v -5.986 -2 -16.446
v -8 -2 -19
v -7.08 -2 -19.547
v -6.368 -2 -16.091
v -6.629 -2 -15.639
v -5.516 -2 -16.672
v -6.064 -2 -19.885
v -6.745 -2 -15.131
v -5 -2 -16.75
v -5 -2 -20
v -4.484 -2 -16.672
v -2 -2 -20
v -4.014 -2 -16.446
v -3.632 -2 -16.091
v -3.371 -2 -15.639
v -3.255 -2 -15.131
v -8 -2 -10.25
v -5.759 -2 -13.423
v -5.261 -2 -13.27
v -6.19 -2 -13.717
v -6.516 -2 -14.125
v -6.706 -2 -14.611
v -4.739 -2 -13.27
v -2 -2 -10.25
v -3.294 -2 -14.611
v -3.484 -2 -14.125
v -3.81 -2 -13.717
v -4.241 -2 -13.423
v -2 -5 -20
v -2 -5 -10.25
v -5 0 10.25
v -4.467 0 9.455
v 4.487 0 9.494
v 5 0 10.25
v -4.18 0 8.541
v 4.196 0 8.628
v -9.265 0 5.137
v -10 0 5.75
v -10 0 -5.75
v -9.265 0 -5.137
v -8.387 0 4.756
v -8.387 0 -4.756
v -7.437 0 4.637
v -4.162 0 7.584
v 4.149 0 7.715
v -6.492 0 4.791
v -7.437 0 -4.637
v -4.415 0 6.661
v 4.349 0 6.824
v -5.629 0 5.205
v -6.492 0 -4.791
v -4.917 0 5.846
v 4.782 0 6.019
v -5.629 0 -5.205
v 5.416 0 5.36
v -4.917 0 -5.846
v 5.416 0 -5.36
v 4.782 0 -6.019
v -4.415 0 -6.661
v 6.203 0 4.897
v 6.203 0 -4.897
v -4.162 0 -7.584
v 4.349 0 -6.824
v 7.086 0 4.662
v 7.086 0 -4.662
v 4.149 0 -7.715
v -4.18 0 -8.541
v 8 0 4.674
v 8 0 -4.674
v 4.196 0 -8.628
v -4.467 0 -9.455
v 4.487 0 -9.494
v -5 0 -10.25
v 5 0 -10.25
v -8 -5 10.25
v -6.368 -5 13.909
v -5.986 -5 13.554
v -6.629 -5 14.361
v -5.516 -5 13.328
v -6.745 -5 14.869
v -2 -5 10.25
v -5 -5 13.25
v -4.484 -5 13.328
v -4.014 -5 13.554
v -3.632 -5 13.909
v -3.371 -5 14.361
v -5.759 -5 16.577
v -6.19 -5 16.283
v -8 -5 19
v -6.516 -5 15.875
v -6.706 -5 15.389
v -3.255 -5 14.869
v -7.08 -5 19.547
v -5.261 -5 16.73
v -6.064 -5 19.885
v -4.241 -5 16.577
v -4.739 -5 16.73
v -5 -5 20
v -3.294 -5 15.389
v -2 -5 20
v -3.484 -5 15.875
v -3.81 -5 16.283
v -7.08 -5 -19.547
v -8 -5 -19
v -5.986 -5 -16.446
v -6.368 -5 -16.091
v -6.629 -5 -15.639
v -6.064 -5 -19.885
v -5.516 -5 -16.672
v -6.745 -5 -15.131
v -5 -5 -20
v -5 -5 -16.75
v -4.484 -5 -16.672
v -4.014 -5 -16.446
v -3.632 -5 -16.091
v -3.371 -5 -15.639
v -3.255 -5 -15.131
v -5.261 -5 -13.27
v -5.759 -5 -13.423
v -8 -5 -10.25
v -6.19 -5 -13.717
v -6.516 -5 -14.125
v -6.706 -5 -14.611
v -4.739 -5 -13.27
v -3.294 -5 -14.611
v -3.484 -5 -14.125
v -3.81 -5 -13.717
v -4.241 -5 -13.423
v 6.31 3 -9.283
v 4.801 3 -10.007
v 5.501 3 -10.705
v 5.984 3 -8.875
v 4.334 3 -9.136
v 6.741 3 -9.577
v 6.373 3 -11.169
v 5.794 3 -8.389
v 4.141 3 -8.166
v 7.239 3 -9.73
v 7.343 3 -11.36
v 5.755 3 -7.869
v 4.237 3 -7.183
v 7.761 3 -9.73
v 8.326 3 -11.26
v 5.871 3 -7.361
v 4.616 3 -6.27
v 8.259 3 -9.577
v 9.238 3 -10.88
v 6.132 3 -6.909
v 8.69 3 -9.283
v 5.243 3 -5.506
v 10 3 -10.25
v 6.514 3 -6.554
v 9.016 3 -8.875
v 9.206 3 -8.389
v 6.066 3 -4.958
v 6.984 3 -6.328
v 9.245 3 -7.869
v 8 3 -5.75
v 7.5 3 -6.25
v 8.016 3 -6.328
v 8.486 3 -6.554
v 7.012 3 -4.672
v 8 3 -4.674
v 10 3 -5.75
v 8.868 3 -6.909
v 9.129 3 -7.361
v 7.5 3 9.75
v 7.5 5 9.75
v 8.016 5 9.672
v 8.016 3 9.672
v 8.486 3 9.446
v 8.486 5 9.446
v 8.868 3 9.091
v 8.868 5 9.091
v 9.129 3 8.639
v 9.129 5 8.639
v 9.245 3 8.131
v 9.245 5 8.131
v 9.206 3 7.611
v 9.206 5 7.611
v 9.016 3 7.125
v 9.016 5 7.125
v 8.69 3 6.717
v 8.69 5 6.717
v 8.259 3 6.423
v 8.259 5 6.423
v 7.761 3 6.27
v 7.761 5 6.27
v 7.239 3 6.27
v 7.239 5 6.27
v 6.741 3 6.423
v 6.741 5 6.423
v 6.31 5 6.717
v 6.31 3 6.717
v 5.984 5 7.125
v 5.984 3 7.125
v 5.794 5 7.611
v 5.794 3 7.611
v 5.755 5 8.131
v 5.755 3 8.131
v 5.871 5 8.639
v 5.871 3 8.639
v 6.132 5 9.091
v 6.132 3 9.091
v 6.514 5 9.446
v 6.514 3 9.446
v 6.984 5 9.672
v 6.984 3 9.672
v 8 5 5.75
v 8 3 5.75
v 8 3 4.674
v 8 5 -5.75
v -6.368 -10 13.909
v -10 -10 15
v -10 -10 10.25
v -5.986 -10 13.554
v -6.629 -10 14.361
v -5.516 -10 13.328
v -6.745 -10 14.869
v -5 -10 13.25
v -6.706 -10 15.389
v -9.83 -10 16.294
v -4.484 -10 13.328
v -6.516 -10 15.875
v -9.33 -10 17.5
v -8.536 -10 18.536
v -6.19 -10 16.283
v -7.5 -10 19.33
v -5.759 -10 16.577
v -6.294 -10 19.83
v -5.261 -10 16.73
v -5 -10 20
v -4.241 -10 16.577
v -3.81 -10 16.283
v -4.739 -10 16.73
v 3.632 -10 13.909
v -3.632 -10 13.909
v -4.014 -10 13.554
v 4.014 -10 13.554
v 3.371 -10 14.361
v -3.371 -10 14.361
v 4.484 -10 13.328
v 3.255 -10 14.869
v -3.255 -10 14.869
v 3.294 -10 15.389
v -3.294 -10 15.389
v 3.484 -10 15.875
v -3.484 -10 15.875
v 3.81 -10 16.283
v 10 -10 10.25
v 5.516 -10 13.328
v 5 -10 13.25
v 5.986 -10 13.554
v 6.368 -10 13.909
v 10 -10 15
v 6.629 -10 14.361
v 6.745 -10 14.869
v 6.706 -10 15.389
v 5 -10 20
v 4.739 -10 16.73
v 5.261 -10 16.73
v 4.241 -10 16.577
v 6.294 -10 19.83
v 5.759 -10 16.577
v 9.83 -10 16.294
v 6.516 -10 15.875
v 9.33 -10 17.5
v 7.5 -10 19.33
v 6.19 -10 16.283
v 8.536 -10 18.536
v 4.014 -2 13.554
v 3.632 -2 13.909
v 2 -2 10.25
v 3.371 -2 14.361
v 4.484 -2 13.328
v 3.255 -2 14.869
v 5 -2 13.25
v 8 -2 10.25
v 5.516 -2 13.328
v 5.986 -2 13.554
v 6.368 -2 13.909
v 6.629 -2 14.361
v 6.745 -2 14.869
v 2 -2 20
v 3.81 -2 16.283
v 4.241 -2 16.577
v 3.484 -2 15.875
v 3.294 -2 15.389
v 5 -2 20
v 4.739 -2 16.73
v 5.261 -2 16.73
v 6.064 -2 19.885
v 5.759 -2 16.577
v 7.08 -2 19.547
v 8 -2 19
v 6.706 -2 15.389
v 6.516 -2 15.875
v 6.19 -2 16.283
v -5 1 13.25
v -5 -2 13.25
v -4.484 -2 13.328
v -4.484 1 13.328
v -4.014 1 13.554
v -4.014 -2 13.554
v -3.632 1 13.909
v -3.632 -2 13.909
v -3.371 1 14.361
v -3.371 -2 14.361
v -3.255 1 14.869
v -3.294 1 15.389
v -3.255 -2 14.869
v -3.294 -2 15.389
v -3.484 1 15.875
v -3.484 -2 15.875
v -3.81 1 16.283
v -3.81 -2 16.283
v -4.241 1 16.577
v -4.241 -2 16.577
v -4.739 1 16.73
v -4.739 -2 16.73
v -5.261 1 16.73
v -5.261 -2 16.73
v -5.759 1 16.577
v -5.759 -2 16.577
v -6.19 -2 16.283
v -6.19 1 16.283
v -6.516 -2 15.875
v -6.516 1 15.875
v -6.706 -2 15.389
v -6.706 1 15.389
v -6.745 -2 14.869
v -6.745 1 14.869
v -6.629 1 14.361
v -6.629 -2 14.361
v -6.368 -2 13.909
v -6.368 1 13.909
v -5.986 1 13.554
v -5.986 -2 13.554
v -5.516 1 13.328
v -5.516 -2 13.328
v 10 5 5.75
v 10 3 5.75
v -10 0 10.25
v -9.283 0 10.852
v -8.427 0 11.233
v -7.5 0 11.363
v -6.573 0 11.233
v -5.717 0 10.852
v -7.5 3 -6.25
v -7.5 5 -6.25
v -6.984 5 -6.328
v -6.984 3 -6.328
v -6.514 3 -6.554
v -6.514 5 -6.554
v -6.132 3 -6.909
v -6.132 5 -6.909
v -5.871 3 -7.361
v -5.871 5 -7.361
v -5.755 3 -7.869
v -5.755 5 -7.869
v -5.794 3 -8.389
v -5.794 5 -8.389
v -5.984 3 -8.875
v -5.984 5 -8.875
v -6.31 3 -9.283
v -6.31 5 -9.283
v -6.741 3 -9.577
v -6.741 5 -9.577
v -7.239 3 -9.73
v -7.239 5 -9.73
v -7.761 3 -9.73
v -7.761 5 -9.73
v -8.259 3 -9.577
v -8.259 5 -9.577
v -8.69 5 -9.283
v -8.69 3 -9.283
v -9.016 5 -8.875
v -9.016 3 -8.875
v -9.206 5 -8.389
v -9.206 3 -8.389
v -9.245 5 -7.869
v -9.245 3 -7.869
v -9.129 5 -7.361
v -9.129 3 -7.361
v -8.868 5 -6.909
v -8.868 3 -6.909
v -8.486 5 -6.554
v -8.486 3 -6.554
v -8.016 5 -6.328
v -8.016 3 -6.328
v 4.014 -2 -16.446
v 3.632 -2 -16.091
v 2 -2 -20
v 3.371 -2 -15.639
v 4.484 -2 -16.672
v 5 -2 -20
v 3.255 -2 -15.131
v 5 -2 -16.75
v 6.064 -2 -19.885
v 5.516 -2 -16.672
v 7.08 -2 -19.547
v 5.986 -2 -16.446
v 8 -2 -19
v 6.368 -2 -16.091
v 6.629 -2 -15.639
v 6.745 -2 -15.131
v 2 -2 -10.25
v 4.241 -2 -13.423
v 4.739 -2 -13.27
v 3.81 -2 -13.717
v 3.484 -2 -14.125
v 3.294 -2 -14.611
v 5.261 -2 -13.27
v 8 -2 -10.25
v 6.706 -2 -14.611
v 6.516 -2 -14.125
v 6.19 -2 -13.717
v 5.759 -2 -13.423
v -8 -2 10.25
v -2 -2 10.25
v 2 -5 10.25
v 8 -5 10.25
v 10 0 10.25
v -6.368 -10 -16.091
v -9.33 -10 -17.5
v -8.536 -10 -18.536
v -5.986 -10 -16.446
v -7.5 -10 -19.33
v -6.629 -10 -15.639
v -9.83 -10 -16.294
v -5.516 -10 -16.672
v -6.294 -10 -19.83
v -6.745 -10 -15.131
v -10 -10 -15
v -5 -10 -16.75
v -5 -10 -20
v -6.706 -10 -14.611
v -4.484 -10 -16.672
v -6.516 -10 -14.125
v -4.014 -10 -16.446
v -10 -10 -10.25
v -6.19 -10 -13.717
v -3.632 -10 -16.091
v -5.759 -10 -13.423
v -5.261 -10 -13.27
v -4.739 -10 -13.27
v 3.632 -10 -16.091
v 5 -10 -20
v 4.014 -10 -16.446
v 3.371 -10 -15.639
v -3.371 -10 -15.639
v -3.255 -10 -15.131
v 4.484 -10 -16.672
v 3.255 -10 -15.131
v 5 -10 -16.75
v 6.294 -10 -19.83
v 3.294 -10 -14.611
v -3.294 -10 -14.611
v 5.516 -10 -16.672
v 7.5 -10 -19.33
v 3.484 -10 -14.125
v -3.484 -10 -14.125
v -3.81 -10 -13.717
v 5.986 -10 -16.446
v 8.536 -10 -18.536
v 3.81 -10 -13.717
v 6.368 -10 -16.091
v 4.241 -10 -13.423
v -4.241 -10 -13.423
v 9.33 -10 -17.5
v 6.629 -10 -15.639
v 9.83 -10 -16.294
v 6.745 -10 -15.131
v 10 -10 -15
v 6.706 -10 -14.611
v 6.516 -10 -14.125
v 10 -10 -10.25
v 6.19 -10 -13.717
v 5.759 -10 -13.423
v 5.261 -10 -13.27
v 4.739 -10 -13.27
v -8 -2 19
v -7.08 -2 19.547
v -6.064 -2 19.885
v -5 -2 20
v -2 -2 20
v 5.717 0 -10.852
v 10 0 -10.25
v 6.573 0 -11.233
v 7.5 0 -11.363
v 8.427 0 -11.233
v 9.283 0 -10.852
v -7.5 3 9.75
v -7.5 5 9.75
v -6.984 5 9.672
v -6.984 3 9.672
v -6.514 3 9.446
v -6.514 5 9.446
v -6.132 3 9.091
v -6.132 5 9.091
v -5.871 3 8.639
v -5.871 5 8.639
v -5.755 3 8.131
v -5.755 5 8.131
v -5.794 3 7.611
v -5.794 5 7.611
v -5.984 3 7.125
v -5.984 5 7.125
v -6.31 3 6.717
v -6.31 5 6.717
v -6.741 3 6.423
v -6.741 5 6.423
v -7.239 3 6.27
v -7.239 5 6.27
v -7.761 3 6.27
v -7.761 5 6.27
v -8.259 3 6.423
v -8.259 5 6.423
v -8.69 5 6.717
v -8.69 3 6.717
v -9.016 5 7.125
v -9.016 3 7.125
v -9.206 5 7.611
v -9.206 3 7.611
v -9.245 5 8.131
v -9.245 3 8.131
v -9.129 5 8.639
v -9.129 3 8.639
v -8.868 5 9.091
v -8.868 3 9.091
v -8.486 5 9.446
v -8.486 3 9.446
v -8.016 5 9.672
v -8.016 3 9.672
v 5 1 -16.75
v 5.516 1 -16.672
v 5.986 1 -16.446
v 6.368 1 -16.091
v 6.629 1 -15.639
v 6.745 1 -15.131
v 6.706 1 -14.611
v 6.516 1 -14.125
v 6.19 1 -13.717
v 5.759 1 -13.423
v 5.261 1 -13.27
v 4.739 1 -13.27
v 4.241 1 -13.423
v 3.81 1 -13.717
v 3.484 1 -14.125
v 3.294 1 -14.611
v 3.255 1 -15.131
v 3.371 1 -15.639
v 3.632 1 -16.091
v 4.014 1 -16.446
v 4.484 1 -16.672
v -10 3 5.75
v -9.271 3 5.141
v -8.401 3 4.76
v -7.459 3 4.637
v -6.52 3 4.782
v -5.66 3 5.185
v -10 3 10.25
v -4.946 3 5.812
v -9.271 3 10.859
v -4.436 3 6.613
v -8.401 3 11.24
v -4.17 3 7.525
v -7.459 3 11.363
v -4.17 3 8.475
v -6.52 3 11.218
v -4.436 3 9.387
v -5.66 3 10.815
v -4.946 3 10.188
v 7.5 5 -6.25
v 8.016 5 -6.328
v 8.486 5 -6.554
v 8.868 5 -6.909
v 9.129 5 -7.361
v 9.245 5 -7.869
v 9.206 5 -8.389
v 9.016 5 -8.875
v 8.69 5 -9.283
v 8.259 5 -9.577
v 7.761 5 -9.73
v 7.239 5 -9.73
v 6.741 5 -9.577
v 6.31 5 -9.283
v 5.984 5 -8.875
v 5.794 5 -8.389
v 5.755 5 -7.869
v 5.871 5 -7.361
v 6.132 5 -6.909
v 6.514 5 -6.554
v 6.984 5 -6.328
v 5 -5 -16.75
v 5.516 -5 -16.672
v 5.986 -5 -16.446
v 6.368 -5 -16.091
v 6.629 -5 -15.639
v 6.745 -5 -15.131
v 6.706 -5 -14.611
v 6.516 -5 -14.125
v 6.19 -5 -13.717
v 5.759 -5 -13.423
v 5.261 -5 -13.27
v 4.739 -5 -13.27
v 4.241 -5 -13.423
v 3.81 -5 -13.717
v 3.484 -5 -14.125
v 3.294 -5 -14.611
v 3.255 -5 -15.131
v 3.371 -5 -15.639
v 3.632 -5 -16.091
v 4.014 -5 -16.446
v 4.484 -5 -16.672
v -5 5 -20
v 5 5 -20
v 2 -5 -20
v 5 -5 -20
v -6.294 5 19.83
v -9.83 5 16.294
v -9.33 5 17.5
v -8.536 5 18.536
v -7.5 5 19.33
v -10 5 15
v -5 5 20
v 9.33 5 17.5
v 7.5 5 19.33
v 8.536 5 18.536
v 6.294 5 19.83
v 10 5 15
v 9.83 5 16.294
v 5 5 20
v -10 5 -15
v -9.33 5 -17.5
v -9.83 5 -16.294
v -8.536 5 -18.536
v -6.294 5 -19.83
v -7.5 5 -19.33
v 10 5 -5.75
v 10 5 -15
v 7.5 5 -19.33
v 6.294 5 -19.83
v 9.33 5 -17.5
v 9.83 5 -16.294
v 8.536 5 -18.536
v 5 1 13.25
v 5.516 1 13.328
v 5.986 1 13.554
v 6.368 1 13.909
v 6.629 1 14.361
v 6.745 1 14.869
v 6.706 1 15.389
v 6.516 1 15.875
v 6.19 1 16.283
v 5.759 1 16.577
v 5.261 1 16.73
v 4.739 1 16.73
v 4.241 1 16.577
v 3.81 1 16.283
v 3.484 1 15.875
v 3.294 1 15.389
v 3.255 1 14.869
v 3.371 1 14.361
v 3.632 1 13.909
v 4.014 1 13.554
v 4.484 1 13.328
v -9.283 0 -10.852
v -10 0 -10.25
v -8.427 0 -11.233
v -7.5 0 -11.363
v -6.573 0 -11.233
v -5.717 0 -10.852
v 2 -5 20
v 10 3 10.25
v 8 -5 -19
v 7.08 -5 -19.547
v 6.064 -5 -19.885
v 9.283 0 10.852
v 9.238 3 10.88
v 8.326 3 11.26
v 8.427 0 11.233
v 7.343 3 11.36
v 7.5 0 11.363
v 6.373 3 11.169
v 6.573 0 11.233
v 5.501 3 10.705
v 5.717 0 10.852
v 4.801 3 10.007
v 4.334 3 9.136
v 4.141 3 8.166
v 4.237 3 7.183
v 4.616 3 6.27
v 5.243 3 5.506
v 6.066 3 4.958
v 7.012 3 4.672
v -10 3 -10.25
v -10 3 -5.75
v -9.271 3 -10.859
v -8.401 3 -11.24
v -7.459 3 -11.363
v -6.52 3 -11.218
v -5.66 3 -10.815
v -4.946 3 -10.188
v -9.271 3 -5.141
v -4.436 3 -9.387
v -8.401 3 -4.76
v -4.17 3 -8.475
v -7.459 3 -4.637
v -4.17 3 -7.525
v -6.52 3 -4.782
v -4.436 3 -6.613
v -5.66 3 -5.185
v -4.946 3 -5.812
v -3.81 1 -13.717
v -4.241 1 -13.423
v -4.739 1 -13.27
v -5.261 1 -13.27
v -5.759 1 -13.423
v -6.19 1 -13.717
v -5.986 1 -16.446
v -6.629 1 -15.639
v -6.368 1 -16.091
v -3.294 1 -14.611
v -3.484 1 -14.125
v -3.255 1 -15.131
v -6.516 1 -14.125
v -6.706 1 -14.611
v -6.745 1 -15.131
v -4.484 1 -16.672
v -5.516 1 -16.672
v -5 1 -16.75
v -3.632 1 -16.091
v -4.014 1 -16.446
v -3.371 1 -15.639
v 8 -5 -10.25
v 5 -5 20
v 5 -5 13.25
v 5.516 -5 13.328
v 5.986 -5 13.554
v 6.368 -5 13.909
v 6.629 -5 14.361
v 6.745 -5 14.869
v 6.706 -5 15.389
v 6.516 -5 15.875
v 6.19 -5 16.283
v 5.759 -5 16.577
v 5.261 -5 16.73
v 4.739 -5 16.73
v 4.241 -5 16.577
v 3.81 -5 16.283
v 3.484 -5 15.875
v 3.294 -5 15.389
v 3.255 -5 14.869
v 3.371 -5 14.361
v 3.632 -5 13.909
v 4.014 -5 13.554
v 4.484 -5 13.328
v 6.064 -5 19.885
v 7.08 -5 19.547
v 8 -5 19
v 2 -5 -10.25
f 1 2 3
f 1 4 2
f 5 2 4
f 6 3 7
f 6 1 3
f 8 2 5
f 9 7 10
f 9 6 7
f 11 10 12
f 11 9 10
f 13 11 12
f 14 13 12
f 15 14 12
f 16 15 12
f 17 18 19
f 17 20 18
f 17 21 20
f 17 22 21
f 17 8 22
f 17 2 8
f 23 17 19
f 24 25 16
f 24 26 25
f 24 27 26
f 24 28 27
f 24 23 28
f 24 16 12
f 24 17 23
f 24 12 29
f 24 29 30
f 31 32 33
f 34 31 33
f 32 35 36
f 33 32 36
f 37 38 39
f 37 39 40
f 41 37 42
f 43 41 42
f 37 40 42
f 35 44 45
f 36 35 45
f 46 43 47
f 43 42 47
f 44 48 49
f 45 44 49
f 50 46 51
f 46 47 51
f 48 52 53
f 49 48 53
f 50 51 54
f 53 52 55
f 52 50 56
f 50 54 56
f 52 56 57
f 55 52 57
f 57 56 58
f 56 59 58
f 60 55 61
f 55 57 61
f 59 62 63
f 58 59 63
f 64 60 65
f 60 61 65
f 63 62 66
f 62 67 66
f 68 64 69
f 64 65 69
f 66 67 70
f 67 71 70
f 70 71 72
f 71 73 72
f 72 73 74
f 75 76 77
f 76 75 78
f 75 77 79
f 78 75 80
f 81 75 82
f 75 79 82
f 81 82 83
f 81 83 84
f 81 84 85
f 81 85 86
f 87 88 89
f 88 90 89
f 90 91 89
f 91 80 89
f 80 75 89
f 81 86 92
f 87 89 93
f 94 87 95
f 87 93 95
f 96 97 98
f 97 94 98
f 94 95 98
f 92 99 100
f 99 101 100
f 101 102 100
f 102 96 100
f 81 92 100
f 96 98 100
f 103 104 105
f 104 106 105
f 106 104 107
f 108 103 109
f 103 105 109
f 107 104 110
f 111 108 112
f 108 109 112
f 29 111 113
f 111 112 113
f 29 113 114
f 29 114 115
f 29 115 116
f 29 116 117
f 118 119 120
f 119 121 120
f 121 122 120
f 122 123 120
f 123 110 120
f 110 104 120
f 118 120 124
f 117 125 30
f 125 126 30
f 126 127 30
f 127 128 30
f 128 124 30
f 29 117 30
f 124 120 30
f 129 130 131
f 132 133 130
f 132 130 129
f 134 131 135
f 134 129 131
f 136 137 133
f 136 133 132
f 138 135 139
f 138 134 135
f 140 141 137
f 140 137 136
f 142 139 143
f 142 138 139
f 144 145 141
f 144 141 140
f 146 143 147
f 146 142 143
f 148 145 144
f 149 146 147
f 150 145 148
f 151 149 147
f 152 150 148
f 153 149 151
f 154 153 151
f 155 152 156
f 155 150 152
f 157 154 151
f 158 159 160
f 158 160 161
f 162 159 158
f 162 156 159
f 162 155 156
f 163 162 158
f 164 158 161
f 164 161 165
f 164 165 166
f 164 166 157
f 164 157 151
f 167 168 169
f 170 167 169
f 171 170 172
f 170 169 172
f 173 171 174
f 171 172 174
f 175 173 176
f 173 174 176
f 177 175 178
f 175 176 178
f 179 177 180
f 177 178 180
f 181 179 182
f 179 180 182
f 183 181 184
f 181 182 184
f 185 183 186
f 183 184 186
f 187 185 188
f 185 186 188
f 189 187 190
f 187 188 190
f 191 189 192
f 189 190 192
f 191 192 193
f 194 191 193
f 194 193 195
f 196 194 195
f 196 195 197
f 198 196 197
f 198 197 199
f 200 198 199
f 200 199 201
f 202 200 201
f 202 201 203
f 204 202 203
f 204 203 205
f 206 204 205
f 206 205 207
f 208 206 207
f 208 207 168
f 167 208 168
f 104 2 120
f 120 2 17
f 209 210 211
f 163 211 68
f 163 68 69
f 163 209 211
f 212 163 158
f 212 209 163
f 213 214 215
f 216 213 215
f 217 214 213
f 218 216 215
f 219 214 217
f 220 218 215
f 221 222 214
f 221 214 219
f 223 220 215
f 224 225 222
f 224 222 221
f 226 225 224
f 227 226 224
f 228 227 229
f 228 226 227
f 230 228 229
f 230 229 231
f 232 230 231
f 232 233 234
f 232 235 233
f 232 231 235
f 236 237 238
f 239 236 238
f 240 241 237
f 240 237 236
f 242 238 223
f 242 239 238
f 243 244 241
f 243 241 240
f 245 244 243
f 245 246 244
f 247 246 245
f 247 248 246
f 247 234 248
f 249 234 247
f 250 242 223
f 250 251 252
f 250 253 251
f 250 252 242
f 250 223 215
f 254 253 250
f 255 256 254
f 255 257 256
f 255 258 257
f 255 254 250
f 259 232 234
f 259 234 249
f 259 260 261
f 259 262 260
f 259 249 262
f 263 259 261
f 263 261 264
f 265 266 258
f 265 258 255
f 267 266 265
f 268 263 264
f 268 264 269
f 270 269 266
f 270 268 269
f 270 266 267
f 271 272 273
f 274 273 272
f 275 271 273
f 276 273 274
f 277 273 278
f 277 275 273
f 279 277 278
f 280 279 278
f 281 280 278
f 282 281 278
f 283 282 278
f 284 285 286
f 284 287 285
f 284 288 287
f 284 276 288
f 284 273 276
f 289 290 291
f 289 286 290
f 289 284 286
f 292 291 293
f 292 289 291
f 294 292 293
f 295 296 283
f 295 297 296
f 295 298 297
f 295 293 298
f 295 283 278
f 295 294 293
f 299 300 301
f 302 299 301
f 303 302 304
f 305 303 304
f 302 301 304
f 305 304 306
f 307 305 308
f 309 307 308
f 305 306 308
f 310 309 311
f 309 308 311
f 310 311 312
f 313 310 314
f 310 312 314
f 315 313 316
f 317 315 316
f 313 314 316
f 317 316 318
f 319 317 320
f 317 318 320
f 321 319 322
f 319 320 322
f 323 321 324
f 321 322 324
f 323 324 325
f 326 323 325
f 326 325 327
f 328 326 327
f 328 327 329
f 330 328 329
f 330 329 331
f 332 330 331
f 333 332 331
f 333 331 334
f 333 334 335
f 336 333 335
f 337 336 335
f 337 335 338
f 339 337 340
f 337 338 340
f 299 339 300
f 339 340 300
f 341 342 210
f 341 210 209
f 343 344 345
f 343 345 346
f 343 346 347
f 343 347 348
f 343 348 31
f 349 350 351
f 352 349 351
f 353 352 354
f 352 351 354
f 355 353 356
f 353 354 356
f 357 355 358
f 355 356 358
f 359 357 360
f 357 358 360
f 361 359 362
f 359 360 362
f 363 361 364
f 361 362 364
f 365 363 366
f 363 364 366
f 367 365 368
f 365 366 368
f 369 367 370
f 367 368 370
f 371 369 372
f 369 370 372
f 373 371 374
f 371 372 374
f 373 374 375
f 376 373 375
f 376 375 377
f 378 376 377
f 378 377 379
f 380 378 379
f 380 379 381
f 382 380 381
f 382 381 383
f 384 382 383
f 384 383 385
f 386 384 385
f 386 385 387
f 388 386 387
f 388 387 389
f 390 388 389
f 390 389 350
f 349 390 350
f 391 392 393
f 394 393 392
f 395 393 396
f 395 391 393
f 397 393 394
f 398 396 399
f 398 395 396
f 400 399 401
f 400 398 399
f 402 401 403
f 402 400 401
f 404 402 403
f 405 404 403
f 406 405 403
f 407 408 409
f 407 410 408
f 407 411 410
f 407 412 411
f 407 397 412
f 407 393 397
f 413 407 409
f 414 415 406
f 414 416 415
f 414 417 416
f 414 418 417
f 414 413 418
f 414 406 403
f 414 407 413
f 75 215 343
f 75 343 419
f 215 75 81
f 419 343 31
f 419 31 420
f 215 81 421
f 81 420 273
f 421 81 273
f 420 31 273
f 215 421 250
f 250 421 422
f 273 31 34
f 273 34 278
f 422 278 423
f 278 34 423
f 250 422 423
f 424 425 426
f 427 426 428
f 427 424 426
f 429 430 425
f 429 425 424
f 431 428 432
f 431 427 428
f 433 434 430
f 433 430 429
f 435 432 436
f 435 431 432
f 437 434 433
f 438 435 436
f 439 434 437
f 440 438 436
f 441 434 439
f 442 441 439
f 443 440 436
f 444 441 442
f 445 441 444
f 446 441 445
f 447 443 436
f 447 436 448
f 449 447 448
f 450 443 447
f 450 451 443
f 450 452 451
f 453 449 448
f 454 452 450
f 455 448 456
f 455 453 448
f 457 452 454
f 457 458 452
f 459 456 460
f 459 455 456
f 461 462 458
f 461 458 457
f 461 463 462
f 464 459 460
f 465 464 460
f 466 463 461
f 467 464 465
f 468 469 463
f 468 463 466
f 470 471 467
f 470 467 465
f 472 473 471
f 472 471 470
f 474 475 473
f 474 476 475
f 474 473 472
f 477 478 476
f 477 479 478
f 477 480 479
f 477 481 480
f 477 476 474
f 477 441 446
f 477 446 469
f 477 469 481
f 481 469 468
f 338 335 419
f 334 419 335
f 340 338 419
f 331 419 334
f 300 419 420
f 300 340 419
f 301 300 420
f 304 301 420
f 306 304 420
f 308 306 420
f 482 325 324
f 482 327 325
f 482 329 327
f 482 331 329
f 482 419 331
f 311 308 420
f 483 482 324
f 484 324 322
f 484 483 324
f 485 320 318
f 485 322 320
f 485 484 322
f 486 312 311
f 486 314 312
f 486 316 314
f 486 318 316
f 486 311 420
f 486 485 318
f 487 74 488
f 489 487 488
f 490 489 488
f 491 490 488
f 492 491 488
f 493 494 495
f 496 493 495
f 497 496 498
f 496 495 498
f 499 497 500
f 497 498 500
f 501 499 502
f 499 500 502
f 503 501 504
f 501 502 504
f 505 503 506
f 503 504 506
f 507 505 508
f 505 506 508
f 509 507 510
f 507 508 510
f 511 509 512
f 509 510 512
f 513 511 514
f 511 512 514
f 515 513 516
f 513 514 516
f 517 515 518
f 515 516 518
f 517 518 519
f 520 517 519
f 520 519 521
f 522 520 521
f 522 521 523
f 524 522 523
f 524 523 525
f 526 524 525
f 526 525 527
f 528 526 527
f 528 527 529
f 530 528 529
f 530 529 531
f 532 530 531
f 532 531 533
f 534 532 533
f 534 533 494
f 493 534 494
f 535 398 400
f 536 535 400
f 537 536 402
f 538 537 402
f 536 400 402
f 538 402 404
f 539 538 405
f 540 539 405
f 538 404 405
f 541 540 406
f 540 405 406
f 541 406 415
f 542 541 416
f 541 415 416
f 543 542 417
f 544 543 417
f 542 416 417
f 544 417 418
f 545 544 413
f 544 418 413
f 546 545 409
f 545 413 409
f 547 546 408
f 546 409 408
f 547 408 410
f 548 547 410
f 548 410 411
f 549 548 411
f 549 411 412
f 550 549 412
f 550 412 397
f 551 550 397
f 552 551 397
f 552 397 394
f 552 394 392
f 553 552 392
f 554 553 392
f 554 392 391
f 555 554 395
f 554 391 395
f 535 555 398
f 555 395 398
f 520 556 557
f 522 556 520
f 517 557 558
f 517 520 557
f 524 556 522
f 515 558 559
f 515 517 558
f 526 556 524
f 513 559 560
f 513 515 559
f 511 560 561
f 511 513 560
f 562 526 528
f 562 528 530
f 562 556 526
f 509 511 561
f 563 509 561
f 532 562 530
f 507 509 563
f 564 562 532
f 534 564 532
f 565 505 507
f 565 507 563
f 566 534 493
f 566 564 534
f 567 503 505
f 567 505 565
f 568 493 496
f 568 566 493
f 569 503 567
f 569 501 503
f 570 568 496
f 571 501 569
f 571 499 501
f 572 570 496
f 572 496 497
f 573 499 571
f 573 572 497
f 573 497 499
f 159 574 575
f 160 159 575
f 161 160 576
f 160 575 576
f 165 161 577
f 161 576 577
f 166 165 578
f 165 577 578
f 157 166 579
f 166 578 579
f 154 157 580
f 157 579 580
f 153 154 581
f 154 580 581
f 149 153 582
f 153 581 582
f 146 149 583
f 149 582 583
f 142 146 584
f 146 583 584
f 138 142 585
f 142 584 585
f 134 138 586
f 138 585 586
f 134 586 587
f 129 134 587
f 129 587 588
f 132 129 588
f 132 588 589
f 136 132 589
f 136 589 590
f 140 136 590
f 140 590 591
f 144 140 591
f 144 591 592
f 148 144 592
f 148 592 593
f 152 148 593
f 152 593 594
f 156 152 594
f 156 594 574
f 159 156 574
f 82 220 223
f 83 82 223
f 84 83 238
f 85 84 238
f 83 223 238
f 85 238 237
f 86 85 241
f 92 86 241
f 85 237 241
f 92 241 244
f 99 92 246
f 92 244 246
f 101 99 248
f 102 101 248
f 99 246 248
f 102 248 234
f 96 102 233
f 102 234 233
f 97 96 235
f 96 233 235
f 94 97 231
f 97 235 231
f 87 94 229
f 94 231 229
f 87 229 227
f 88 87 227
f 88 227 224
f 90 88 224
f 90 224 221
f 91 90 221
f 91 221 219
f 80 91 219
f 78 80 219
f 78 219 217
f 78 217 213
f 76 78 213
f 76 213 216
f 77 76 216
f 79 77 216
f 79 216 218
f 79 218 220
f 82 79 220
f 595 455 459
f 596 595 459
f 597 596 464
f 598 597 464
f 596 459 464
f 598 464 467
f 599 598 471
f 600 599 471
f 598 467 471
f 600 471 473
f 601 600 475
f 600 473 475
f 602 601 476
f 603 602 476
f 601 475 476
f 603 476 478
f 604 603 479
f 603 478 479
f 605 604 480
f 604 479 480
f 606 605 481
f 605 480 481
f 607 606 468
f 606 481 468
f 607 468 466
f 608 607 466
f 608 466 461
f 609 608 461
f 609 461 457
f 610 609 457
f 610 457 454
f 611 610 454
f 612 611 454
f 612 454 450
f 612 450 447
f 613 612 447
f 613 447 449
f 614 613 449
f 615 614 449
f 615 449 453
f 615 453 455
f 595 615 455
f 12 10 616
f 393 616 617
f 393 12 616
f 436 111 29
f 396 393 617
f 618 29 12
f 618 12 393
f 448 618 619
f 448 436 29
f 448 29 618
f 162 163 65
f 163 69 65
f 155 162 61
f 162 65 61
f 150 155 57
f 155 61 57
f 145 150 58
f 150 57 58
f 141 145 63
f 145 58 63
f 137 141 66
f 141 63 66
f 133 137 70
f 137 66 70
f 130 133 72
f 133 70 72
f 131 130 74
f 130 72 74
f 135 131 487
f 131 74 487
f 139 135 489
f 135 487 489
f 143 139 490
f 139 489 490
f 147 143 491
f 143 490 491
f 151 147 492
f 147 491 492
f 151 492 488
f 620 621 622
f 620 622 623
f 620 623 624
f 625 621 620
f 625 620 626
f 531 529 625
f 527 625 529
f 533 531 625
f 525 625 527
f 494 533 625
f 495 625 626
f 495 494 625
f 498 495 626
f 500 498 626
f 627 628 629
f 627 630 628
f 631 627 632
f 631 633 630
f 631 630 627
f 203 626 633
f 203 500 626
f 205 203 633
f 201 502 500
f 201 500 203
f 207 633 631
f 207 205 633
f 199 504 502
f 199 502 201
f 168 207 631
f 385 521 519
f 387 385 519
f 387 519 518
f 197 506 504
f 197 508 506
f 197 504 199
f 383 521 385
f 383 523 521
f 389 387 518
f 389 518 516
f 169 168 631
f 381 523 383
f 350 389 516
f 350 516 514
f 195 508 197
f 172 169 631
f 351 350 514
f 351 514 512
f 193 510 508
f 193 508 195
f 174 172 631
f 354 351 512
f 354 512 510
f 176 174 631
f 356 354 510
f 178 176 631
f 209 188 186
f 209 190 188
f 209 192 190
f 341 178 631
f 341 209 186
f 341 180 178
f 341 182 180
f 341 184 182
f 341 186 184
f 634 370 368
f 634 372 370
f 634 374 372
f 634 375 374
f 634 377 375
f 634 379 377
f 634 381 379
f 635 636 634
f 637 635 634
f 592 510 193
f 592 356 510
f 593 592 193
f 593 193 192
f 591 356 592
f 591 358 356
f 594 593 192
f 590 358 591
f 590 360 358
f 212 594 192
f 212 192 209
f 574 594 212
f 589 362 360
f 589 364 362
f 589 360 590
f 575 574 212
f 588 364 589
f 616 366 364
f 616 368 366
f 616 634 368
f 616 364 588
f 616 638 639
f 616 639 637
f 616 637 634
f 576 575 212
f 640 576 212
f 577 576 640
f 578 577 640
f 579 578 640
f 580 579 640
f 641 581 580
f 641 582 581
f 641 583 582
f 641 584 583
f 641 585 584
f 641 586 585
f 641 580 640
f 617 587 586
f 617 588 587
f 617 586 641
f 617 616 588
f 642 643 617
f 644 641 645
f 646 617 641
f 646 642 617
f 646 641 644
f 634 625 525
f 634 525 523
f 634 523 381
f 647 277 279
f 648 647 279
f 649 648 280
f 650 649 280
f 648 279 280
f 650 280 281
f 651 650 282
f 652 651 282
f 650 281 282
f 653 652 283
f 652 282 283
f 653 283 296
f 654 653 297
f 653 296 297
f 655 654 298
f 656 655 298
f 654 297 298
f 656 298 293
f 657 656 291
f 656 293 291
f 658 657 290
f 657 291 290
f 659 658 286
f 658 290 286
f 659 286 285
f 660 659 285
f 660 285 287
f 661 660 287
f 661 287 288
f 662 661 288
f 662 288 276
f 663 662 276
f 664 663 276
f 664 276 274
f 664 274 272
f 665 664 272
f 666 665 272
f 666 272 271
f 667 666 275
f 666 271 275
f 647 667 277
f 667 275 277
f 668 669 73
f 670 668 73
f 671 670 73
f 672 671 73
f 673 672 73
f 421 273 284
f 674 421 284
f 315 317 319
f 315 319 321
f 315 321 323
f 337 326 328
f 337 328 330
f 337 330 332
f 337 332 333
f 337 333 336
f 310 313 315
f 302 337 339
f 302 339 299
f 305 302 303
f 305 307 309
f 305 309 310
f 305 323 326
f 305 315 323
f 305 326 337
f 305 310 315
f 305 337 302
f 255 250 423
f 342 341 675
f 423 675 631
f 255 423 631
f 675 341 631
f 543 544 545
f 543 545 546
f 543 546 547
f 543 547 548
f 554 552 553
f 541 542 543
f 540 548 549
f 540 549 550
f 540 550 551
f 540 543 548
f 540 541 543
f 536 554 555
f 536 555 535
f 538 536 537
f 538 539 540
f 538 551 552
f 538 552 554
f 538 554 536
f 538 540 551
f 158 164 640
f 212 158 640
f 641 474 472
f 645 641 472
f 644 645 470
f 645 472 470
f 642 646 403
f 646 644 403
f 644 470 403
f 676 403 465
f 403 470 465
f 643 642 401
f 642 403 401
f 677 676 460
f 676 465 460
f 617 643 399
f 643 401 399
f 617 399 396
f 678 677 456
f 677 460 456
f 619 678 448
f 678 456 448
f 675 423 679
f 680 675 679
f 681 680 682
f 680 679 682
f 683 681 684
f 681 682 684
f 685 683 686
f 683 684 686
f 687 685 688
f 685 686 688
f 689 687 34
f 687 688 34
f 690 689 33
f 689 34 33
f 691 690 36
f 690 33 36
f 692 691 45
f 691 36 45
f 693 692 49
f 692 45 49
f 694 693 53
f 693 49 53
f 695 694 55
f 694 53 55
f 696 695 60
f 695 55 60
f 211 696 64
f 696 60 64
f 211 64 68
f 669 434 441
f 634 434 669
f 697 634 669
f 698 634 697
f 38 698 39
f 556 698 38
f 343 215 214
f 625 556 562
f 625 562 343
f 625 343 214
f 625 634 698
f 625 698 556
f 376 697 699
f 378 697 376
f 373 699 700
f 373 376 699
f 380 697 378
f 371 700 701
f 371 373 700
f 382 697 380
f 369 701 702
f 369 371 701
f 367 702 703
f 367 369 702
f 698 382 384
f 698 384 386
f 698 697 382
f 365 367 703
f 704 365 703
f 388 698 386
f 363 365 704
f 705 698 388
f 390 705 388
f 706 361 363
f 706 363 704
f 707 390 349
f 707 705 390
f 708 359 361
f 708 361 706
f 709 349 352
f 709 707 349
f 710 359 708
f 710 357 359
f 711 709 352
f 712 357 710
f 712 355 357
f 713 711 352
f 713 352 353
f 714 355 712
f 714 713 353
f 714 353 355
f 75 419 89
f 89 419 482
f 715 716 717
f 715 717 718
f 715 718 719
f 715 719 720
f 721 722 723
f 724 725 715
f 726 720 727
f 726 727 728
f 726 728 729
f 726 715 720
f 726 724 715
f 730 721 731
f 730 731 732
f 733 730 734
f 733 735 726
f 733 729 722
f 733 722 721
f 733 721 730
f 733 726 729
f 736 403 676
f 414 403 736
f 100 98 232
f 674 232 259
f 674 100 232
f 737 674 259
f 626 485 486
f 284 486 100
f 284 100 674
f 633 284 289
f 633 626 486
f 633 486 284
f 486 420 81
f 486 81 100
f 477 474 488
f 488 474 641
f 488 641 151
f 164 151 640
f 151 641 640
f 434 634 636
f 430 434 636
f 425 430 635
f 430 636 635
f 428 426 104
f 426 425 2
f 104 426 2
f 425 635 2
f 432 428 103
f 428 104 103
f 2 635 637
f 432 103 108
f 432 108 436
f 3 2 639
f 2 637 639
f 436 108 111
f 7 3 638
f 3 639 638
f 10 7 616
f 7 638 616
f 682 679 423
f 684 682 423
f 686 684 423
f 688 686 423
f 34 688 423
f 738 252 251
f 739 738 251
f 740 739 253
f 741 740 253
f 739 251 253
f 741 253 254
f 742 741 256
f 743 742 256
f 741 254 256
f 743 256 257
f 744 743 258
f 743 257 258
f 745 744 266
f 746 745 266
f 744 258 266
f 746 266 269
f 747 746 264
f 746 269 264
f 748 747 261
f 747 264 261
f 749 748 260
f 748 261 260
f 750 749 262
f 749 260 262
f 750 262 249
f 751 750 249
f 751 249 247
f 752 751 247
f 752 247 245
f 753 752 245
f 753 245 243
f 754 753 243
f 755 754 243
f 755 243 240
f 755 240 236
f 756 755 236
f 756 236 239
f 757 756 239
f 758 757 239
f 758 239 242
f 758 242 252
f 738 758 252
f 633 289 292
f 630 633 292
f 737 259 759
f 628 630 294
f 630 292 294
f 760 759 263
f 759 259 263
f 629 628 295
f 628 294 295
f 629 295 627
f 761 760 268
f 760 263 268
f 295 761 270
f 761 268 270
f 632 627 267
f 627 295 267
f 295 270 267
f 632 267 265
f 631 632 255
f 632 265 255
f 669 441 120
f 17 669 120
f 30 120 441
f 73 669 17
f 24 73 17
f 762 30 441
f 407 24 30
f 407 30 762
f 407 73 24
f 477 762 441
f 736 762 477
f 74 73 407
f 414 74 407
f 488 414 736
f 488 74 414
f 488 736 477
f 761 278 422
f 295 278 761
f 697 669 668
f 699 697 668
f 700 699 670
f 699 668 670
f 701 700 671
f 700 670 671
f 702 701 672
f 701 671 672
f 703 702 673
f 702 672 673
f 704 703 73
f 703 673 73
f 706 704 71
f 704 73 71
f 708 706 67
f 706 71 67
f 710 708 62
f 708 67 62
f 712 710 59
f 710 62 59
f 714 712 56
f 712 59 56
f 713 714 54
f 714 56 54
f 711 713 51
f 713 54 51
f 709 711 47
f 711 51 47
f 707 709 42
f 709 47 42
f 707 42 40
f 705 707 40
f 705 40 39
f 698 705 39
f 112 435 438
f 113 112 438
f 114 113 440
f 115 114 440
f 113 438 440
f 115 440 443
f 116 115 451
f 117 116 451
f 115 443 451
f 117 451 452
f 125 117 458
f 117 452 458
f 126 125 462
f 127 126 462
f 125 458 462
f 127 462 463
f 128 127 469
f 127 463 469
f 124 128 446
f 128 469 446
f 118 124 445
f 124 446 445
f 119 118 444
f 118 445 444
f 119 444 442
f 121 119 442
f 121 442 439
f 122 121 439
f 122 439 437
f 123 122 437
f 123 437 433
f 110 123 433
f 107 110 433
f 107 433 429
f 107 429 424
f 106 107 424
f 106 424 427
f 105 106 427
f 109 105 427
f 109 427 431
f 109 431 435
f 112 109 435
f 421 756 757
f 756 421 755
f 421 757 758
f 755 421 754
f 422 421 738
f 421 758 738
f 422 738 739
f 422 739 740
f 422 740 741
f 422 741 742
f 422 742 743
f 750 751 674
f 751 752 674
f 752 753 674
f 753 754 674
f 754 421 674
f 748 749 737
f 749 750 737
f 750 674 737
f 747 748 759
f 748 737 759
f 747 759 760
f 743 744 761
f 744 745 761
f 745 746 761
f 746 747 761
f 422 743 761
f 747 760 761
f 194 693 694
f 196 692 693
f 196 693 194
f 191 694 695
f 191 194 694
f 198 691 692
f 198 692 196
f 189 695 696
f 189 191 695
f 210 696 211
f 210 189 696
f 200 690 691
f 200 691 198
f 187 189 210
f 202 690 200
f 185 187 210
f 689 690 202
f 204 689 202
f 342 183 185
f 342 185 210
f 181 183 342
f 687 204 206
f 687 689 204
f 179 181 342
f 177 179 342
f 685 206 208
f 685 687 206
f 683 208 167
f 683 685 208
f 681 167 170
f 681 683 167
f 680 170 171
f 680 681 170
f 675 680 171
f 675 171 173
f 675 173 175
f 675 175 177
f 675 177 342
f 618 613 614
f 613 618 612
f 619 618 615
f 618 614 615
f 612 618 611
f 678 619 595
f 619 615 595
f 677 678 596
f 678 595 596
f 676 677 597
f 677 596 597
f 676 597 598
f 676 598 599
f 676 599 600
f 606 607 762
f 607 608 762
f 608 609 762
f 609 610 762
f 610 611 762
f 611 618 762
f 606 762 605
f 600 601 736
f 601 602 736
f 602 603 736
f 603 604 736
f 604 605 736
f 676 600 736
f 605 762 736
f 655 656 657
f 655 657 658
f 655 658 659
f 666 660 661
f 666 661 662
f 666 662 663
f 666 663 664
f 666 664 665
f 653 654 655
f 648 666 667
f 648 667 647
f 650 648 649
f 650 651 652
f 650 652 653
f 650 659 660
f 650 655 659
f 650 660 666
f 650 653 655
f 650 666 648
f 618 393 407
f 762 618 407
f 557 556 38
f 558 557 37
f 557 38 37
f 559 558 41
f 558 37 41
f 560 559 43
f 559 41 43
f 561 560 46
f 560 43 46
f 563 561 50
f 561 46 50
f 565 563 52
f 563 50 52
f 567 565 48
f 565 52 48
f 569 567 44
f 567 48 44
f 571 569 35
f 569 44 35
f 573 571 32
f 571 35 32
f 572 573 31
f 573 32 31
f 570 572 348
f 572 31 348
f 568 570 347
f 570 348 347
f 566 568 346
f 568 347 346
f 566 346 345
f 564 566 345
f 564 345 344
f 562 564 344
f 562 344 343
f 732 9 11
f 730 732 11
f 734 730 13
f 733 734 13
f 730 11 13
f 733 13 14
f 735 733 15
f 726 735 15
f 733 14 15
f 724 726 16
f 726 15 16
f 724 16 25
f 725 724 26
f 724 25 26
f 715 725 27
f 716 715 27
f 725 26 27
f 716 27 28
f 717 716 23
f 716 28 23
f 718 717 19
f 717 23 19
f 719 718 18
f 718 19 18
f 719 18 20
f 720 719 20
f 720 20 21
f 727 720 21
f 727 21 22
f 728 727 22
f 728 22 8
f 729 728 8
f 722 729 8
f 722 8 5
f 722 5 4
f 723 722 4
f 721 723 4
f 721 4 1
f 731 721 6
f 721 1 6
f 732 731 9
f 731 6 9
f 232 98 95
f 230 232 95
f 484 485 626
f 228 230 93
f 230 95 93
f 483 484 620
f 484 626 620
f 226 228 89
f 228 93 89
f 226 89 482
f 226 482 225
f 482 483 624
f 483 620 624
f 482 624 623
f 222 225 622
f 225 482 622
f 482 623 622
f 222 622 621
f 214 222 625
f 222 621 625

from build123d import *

# Parameters (mm, degrees)
SKETCH1_W           = 20
SKETCH1_H           = 40
BOSS_EXTRUDE1_DEPTH = 5
SKETCH2_W           = 20
SKETCH2_H           = 9.75
BOSS_EXTRUDE2_DEPTH = 10
SKETCH3_R           = 1.75
CUT_EXTRUDE1_DEPTH  = 5
SKETCH4_R           = 3.363406012
CUT_EXTRUDE2_DEPTH  = 3
SKETCH5_R           = 1.75
CUT_EXTRUDE3_DEPTH  = 8
SKETCH6_W           = 6
SKETCH6_H           = 10
CUT_EXTRUDE4_DEPTH  = 3
SKETCH7_R           = 1.75
CUT_EXTRUDE5_DEPTH  = 3
FILLET1_R           = 5
SKETCH10_W          = 11.5
SKETCH10_H          = 5
CUT_EXTRUDE6_DEPTH  = 2


with BuildPart() as part:
    # Sketch1 → Boss-Extrude1 (new body)
    with BuildSketch(Plane(origin=(0, 0, 0), x_dir=(1, 0, 0), z_dir=(0, 1, 0))):
        Rectangle(SKETCH1_W, SKETCH1_H)
    extrude(amount=BOSS_EXTRUDE1_DEPTH)

    # Sketch2 → Boss-Extrude2 (add)
    with BuildSketch(Plane.XZ):
        with Locations((0, 15.125)):
            Rectangle(SKETCH2_W, SKETCH2_H)
        with Locations((0, -15.125)):
            Rectangle(SKETCH2_W, SKETCH2_H)
    extrude(amount=BOSS_EXTRUDE2_DEPTH)

    # Sketch3 → Cut-Extrude1 (cut)
    with BuildSketch(Plane(origin=(0, 5, 0), x_dir=(1, 0, 0), z_dir=(0, 1, 0))):
        with Locations(Location((-7.5, -8, 0), (0, 0, 270))):
            Circle(SKETCH3_R)
        with Locations(Location((-7.5, 8, 0), (0, 0, 270))):
            Circle(SKETCH3_R)
        with Locations(Location((7.5, -8, 0), (0, 0, 270))):
            Circle(SKETCH3_R)
        with Locations(Location((7.5, 8, 0), (0, 0, 270))):
            Circle(SKETCH3_R)
    extrude(amount=-CUT_EXTRUDE1_DEPTH, mode=Mode.SUBTRACT)

    # Sketch4 → Cut-Extrude2 (cut)
    with BuildSketch(Plane.XZ):
        with Locations((7.5, 8)):
            Circle(SKETCH4_R)
        with Locations((-7.5, 8)):
            Circle(SKETCH4_R)
        with Locations((-7.5, -8)):
            Circle(SKETCH4_R)
        with Locations((7.5, -8)):
            Circle(SKETCH4_R)
    extrude(amount=-CUT_EXTRUDE2_DEPTH, mode=Mode.SUBTRACT)

    # Sketch5 → Cut-Extrude3 (cut)
    with BuildSketch(Plane.XZ.offset(10)):
        with Locations(Location((-5, -15, 0), (0, 0, 270))):
            Circle(SKETCH5_R)
        with Locations(Location((5, -15, 0), (0, 0, 270))):
            Circle(SKETCH5_R)
        with Locations(Location((-5, 15, 0), (0, 0, 270))):
            Circle(SKETCH5_R)
        with Locations(Location((5, 15, 0), (0, 0, 270))):
            Circle(SKETCH5_R)
    extrude(amount=-CUT_EXTRUDE3_DEPTH, mode=Mode.SUBTRACT)

    # Sketch6 → Cut-Extrude4 (cut)
    with BuildSketch(Plane.XZ.offset(2)):
        with Locations((-5, -15)):
            Rectangle(SKETCH6_W, SKETCH6_H)
        with Locations((5, -15)):
            Rectangle(SKETCH6_W, SKETCH6_H)
        with Locations((5, 15)):
            Rectangle(SKETCH6_W, SKETCH6_H)
        with Locations((-5, 15)):
            Rectangle(SKETCH6_W, SKETCH6_H)
    extrude(amount=CUT_EXTRUDE4_DEPTH, mode=Mode.SUBTRACT)

    # Sketch7 → Cut-Extrude5 (cut)
    with BuildSketch(Plane.XZ.offset(2)):
        with Locations(Location((-5, -15, 0), (0, 0, 270))):
            Circle(SKETCH7_R)
        with Locations(Location((5, -15, 0), (0, 0, 270))):
            Circle(SKETCH7_R)
        with Locations(Location((5, 15, 0), (0, 0, 270))):
            Circle(SKETCH7_R)
        with Locations(Location((-5, 15, 0), (0, 0, 270))):
            Circle(SKETCH7_R)
    extrude(amount=-CUT_EXTRUDE5_DEPTH, mode=Mode.SUBTRACT)

    # Fillet1
    # the kernel refuses this fillet: 5 mm, written as the material it takes off along each edge
    with BuildSketch(Plane(origin=(-10, 17.5, -20), x_dir=(0, 0, 1), z_dir=(0, -1, 0)), Plane(origin=(10, -22.5, -20), x_dir=(0, 0, 1), z_dir=(0, 1, 0)), Plane(origin=(-10, 17.5, 20), x_dir=(1, 0, 0), z_dir=(0, -1, 0)), Plane(origin=(10, -22.5, 20), x_dir=(-1, 0, 0), z_dir=(0, 1, 0))) as fillet1_piece_1:
        with BuildLine():
            CenterArc((FILLET1_R, -FILLET1_R), FILLET1_R, 90, 90)
            Line((0, -FILLET1_R), (0, 0))
            Line((0, 0), (FILLET1_R, 0))
        make_face()
    extrude(amount=40, mode=Mode.SUBTRACT)

    # Sketch10 → Cut-Extrude6 (cut)
    with BuildSketch(Plane(origin=(10, 0, 0), x_dir=(0, 0, -1), z_dir=(1, 0, 0))):
        with Locations((0, 2.5)):
            Rectangle(SKETCH10_W, SKETCH10_H)
    extrude(amount=-CUT_EXTRUDE6_DEPTH, mode=Mode.SUBTRACT)


solid = part.part
